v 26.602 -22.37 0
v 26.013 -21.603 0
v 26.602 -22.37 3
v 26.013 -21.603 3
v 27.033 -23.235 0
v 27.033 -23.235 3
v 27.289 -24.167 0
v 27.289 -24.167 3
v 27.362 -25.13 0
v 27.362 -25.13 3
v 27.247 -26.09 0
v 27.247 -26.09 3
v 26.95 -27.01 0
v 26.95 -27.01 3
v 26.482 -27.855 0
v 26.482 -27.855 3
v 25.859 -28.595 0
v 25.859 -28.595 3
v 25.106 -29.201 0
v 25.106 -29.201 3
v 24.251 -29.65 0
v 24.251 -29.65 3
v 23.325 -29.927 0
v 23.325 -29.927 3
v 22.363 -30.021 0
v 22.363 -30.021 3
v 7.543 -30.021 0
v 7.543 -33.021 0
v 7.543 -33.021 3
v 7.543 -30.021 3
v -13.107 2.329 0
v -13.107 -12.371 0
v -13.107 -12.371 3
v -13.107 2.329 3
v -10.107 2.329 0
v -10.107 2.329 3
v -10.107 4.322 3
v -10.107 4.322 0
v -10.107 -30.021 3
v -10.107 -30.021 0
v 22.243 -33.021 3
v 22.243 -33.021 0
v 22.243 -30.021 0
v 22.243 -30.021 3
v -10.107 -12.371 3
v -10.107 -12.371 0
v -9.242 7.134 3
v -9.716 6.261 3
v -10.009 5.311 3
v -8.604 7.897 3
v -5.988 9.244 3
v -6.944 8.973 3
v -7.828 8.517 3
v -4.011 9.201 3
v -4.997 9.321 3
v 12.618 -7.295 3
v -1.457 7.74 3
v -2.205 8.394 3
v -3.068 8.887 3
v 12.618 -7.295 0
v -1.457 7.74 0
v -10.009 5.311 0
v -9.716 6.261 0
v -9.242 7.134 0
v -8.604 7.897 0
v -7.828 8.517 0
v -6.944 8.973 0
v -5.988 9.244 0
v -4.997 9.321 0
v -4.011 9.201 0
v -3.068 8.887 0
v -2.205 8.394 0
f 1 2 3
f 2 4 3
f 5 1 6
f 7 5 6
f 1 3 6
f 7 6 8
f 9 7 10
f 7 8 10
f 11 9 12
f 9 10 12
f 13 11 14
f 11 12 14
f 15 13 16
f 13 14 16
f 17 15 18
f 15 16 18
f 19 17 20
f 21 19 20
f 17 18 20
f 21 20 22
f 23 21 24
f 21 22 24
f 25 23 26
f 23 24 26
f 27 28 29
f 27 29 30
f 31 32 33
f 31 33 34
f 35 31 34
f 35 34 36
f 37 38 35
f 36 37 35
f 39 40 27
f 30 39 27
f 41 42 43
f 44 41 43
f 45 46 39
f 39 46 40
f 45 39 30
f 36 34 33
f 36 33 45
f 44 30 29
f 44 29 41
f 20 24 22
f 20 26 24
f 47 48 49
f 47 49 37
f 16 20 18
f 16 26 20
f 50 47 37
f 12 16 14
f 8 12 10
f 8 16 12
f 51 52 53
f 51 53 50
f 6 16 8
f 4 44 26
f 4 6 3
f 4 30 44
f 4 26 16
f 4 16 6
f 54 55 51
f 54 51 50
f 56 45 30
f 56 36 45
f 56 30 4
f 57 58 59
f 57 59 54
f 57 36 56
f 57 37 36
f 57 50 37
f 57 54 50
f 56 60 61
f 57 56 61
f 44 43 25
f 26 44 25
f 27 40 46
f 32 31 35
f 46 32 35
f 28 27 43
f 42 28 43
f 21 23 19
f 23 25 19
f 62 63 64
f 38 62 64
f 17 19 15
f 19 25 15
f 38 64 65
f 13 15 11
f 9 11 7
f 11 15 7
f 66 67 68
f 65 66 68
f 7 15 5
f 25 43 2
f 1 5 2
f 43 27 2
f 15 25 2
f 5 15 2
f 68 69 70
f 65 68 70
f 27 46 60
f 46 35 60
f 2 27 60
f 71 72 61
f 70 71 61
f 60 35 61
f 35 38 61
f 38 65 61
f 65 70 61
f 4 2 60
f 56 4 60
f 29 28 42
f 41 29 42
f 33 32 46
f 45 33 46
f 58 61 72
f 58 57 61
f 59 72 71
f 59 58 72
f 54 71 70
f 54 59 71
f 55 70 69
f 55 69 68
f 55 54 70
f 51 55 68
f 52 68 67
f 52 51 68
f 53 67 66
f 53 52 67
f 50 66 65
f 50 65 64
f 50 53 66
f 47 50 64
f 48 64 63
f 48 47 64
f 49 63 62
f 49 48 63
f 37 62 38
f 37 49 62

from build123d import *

# Parameters (mm, degrees)
SKETCH1_W           = 14.7
SKETCH1_H           = 3
SKETCH1_W_2         = 3
SKETCH1_H_2         = 14.7
BOSS_EXTRUDE1_DEPTH = 3
FILLET1_R           = 5


with BuildPart() as part:
    # Sketch1 → Boss-Extrude1 (new body)
    with BuildSketch(Plane.XY):
        Polygon((33.892723269, -30.02061011), (12.617997994, -7.295335385), (-10.107276731, -30.02061011), (7.542723269, -30.02061011), (22.242723269, -30.02061011), align=None)
        with Locations((14.892723269, -31.52061011)):
            Rectangle(SKETCH1_W, SKETCH1_H)
        Polygon((12.617997994, -7.295335385), (-10.107276731, 16.97938989), (-10.107276731, 2.32938989), (-10.107276731, -12.37061011), (-10.107276731, -30.02061011), align=None)
        with Locations((-11.607276731, -5.02061011)):
            Rectangle(SKETCH1_W_2, SKETCH1_H_2)
    extrude(amount=BOSS_EXTRUDE1_DEPTH)

    # Fillet1
    fillet1_edges = [part.edges().sort_by_distance(p)[0] for p in [
        (33.892723269, -30.02061011, 1.5),
        (-10.107276731, 16.97938989, 1.5),
    ]]
    fillet(fillet1_edges, radius=FILLET1_R)


solid = part.part
